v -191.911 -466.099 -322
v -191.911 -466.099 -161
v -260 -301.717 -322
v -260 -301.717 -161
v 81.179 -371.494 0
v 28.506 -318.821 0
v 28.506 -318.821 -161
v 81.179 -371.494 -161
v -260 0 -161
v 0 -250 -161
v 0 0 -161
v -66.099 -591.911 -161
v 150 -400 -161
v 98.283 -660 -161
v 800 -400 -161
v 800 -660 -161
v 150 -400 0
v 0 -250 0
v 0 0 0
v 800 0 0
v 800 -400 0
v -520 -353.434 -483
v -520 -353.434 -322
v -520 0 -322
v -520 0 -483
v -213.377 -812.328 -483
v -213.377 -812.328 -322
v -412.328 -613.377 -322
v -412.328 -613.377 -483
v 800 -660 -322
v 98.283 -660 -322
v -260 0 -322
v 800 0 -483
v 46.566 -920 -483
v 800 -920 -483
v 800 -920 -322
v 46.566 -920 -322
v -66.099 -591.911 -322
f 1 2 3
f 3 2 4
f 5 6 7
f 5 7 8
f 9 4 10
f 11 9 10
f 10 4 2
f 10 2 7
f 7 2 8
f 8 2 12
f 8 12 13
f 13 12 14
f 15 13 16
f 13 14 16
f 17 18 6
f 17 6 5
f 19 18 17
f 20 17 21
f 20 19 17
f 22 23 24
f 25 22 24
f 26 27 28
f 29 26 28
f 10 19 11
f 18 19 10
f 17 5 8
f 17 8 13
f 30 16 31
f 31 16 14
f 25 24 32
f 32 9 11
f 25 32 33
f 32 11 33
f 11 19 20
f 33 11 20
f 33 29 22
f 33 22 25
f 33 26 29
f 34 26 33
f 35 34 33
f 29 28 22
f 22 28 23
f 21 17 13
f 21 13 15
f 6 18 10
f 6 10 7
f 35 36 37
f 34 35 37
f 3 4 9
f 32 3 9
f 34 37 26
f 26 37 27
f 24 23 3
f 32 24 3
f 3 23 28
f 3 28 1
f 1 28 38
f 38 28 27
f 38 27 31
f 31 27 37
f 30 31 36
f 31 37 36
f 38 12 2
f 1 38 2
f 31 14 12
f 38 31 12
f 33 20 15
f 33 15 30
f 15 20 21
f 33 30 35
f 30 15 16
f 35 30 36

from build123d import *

# Parameters (mm, degrees)
F1_DEPTH = 161
F3_DEPTH = 161
F5_DEPTH = 161


with BuildPart() as f1:
    # F0 (on Top) → F1 (new body)
    with BuildSketch(Plane.XY):
        Polygon((800, 0), (0, 0), (0, -250), (28.50642, -318.820585), (81.179415, -371.49358), (150, -400), (800, -400), align=None)
    extrude(amount=-F1_DEPTH)

    # F2 (on face) → F3 (join)
    with BuildSketch(Plane(origin=(0, 0, -161), x_dir=(1, 0, 0), z_dir=(0, 0, -1))):
        Polygon((-191.910937, 466.098754), (-260, 301.717216), (-260, 0), (800, 0), (800, 660), (98.282784, 660), (-66.098754, 591.910937), align=None)
    extrude(amount=F3_DEPTH)

    # F4 (on face) → F5 (join)
    with BuildSketch(Plane(origin=(0, 0, -322), x_dir=(1, 0, 0), z_dir=(0, 0, -1))):
        Polygon((-412.328294, 613.376924), (-520, 353.434431), (-520, 0), (800, 0), (800, 920), (46.565569, 920), (-213.376924, 812.328294), align=None)
    extrude(amount=F5_DEPTH)


solid = f1.part
